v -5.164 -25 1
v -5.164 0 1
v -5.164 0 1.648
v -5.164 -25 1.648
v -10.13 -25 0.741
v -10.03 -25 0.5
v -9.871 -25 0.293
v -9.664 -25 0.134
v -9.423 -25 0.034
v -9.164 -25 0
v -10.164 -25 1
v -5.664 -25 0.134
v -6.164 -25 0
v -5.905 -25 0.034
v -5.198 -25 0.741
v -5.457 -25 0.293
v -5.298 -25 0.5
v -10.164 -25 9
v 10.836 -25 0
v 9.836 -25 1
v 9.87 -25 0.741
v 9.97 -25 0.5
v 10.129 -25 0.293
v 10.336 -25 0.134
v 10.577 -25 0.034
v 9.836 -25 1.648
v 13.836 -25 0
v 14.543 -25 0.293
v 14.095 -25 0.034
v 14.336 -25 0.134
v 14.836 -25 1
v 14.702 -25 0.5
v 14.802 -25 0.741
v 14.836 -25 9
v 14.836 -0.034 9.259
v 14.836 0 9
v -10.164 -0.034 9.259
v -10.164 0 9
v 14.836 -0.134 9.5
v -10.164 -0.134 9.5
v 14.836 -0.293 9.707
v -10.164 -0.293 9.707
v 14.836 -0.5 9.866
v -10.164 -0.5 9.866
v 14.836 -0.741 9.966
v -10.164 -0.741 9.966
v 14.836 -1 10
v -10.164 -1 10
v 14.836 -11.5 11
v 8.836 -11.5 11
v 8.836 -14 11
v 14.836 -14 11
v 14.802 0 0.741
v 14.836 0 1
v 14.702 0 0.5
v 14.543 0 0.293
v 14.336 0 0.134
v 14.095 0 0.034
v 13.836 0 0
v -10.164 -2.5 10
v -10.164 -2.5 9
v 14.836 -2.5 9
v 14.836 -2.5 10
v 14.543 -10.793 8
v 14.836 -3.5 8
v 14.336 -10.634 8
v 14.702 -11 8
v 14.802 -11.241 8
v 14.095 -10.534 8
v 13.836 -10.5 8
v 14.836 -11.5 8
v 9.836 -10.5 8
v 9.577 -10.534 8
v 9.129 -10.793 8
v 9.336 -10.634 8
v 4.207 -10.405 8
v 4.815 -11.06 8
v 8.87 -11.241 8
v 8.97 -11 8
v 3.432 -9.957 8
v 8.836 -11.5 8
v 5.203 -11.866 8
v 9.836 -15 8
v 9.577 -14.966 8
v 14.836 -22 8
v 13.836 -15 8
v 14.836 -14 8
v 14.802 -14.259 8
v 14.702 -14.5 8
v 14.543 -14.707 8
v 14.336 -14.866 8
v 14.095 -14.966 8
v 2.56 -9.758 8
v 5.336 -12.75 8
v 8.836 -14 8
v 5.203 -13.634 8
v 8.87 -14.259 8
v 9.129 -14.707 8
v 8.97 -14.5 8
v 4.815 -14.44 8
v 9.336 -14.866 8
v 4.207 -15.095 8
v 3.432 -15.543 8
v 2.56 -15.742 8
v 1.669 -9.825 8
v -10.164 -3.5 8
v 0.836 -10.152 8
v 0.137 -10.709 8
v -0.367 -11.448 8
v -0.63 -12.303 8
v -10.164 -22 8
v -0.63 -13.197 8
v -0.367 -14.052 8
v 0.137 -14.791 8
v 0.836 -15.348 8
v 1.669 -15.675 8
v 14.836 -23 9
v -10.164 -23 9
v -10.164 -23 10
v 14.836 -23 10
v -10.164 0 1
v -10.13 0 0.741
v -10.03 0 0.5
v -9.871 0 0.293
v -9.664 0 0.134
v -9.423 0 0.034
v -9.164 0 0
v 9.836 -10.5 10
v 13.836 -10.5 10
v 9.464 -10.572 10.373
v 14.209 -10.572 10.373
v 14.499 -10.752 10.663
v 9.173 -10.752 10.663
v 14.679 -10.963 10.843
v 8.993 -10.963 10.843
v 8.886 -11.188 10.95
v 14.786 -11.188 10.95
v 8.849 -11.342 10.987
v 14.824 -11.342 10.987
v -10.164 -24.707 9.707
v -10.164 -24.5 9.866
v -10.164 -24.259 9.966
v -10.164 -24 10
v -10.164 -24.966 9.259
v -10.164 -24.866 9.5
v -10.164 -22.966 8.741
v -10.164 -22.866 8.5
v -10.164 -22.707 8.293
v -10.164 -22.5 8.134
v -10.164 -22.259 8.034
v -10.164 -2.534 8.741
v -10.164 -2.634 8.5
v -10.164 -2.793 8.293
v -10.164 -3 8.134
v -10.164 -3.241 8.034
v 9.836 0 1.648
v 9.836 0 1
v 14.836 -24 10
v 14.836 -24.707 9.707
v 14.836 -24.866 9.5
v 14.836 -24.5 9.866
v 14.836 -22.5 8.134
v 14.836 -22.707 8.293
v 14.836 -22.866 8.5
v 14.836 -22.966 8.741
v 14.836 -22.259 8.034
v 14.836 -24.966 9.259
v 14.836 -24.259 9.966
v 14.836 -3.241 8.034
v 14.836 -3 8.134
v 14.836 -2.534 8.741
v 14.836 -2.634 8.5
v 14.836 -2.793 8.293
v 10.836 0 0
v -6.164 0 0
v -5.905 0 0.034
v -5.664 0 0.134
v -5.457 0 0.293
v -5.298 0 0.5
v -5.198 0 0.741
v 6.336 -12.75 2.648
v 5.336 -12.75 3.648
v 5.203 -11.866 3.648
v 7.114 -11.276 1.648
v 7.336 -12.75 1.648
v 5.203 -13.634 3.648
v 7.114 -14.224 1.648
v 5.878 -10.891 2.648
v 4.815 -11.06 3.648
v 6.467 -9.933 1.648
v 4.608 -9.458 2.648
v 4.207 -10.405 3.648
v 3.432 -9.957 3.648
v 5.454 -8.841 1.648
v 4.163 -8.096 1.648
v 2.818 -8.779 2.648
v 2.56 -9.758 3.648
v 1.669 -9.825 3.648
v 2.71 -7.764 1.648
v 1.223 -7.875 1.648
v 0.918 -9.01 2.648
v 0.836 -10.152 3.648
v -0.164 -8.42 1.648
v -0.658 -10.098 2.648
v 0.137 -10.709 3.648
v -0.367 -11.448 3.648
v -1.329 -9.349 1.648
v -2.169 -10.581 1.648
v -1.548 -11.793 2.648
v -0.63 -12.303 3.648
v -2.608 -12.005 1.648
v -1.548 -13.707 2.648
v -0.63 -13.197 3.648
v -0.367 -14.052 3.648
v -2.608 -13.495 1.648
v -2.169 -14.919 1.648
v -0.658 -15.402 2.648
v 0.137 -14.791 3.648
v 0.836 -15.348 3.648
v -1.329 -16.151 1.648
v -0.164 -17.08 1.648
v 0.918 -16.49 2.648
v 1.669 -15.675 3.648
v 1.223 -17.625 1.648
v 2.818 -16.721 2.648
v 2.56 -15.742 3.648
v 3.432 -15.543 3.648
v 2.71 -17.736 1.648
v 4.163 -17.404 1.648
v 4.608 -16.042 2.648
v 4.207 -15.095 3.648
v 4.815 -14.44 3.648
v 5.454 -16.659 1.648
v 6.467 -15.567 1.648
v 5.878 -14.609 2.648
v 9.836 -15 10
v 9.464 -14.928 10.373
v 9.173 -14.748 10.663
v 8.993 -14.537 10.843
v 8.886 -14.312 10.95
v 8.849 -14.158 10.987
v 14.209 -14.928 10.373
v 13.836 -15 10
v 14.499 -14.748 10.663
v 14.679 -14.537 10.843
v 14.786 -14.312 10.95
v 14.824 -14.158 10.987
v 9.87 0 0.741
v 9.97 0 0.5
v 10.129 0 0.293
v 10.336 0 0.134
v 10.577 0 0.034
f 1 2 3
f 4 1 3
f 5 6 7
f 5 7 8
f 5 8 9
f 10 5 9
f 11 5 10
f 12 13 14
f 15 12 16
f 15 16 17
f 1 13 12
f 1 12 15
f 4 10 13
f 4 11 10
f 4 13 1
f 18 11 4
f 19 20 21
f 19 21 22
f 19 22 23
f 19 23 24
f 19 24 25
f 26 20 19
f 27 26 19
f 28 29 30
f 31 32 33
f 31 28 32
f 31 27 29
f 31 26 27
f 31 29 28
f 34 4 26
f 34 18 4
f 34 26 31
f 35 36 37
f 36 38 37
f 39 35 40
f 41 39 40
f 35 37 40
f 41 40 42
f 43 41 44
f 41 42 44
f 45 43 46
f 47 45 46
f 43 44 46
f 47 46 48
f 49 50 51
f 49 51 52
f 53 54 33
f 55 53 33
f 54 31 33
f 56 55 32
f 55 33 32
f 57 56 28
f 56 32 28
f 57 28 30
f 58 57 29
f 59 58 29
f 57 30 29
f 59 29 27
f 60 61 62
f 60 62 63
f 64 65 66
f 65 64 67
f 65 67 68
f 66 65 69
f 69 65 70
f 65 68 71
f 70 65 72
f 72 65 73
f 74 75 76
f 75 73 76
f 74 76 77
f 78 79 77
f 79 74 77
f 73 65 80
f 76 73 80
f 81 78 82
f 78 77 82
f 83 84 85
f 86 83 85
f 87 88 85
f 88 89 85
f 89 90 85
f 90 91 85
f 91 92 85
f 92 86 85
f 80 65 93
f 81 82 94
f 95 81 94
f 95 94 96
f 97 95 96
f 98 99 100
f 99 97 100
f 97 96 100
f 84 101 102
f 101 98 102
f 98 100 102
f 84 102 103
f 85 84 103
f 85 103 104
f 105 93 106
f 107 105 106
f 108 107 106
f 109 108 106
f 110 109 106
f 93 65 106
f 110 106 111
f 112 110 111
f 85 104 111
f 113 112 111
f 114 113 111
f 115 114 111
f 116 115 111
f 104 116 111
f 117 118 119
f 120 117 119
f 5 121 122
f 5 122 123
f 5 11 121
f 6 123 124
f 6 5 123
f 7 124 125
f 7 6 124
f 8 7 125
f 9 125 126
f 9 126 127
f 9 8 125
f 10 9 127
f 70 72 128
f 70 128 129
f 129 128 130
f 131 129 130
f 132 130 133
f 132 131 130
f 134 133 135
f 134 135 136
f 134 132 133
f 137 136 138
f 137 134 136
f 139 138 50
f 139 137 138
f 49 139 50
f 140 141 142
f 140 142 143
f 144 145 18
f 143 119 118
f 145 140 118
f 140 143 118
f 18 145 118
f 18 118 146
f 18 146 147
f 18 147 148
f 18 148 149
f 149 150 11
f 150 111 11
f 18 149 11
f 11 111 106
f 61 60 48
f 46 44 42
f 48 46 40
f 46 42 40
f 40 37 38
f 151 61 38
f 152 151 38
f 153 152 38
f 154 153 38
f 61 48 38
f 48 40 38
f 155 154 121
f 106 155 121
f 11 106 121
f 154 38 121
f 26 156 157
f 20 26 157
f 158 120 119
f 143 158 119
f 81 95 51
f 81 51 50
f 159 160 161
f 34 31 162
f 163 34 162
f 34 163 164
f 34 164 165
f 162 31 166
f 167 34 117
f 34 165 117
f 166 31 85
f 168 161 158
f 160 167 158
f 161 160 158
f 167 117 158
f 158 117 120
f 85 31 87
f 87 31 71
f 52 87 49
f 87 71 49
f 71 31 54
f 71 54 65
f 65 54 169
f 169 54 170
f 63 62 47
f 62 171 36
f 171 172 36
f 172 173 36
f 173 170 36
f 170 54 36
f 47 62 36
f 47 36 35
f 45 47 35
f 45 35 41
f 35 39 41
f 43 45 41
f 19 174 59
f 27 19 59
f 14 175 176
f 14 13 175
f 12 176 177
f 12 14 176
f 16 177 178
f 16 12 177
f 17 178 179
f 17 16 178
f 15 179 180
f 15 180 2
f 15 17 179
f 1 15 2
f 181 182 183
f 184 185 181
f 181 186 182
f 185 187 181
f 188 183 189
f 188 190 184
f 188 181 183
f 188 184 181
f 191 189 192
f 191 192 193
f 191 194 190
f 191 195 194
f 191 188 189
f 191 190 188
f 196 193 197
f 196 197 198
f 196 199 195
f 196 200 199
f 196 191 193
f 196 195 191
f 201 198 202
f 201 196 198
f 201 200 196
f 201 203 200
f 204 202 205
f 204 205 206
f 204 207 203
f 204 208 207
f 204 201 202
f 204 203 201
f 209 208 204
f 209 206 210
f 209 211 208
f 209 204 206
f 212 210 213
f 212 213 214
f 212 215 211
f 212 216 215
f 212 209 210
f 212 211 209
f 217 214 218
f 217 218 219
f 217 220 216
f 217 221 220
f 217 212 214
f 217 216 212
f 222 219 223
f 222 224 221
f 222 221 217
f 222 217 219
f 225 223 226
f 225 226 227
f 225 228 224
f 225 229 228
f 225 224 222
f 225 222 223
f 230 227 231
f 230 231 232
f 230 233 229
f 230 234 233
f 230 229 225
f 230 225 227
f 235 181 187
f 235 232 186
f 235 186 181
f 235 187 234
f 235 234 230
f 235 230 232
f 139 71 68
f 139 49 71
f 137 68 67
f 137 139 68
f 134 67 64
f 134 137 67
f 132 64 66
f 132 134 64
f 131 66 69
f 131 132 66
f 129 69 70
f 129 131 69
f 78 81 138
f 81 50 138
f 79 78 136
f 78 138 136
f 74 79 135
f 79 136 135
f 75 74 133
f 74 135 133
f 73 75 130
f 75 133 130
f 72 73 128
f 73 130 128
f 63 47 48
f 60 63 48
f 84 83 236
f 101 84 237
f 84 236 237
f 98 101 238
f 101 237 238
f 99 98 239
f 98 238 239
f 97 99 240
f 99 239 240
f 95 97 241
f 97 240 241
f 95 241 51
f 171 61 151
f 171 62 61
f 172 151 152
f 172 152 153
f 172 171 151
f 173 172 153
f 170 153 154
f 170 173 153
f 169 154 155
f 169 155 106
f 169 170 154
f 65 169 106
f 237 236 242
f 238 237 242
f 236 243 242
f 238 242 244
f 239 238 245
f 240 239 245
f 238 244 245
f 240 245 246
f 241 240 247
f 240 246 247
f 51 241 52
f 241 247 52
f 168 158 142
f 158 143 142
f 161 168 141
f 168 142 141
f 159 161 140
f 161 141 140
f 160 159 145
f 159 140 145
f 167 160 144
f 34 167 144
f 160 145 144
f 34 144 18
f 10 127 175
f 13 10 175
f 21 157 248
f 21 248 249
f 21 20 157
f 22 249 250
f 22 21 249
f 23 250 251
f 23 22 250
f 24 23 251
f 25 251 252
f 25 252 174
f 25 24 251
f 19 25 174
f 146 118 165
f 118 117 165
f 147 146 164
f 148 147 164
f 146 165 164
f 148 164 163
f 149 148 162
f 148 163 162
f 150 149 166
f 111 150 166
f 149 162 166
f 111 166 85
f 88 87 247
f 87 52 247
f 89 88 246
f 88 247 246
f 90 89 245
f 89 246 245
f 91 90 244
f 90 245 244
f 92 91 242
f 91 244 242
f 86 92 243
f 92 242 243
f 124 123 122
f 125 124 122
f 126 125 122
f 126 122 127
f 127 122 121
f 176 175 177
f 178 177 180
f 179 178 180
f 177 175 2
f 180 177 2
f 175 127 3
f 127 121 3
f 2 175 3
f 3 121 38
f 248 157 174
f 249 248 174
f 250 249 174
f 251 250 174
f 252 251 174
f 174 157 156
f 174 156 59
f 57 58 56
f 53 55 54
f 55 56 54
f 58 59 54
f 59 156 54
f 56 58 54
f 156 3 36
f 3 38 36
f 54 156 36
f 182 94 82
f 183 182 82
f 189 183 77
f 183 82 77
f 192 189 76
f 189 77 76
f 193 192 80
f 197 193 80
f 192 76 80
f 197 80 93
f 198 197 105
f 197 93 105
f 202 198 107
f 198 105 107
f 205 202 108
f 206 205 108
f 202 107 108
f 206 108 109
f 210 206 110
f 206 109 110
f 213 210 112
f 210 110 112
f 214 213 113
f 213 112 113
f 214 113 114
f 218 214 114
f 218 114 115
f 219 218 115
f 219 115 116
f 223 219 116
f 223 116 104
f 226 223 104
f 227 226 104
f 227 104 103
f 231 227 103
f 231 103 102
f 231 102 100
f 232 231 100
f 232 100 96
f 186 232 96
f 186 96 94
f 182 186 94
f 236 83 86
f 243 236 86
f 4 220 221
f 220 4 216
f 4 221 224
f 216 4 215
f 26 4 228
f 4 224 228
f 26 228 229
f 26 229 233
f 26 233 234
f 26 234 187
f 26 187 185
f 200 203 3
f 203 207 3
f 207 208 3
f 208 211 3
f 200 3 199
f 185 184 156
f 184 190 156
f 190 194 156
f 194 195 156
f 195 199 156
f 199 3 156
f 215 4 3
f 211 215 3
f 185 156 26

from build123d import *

# Parameters (mm, degrees)
F1_DEPTH = 25
F2_W     = 20.5
F2_H     = 2
F3_DEPTH = 25
F4_R     = 3
F5_DEPTH = 25
F4_W     = 6
F4_H     = 4.5
F6_DEPTH = 3
F7_R     = 1
F8_R     = 1
F9_SIZE  = 2


with BuildPart() as f1:
    # F0 (on Front) → F1 (new body)
    with BuildSketch(Plane.XZ):
        Polygon((14.836072953, 10), (-10.163927047, 10), (-10.163927047, 0), (-5.163927047, 0), (-5.163927047, 1.6477254958), (9.836072953, 1.6477254958), (9.836072953, 0), (14.836072953, 0), align=None)
    extrude(amount=F1_DEPTH)

    # F2 (on face) → F3 (cut)
    with BuildSketch(Plane(origin=(-10.163927047, 0, 0), x_dir=(0, -1, 0), z_dir=(-1, 0, 0))):
        with Locations((12.75, 9)):
            Rectangle(F2_W, F2_H)
    extrude(amount=-F3_DEPTH, mode=Mode.SUBTRACT)

    # F4 (on face) → F5 (cut)
    with BuildSketch(Plane.XY.offset(8)):
        with Locations((2.336072953, -12.75)):
            Circle(F4_R)
    extrude(amount=-F5_DEPTH, mode=Mode.SUBTRACT)

    # F4 (on face) → F6 (join)
    with BuildSketch(Plane.XY.offset(8)):
        with Locations((11.836072953, -12.75)):
            Rectangle(F4_W, F4_H)
    extrude(amount=F6_DEPTH)

    # F7
    f7_edges = [f1.edges().sort_by_distance(p)[0] for p in [
        (11.836073, -10.5, 11),
        (11.836073, -15, 11),
        (8.836073, -10.5, 9.5),
        (8.836073, -15, 9.5),
        (14.836073, -10.5, 9.5),
        (14.836073, -15, 9.5),
    ]]
    fillet(f7_edges, radius=F7_R)

    # F8
    f8_edges = [f1.edges().sort_by_distance(p)[0] for p in [
        (2.336073, -23, 8),
        (2.336073, -2.5, 8),
        (2.336073, -25, 10),
        (2.336073, 0, 10),
        (-10.163927, -12.5, 0),
        (-5.163927, -12.5, 0),
        (9.836073, -12.5, 0),
        (14.836073, -12.5, 0),
    ]]
    fillet(f8_edges, radius=F8_R)

    # F9
    f9_edges = [f1.edges().sort_by_distance(p)[0] for p in [
        (-0.663927, -12.75, 1.647725),
    ]]
    chamfer(f9_edges, length=F9_SIZE)


solid = f1.part
